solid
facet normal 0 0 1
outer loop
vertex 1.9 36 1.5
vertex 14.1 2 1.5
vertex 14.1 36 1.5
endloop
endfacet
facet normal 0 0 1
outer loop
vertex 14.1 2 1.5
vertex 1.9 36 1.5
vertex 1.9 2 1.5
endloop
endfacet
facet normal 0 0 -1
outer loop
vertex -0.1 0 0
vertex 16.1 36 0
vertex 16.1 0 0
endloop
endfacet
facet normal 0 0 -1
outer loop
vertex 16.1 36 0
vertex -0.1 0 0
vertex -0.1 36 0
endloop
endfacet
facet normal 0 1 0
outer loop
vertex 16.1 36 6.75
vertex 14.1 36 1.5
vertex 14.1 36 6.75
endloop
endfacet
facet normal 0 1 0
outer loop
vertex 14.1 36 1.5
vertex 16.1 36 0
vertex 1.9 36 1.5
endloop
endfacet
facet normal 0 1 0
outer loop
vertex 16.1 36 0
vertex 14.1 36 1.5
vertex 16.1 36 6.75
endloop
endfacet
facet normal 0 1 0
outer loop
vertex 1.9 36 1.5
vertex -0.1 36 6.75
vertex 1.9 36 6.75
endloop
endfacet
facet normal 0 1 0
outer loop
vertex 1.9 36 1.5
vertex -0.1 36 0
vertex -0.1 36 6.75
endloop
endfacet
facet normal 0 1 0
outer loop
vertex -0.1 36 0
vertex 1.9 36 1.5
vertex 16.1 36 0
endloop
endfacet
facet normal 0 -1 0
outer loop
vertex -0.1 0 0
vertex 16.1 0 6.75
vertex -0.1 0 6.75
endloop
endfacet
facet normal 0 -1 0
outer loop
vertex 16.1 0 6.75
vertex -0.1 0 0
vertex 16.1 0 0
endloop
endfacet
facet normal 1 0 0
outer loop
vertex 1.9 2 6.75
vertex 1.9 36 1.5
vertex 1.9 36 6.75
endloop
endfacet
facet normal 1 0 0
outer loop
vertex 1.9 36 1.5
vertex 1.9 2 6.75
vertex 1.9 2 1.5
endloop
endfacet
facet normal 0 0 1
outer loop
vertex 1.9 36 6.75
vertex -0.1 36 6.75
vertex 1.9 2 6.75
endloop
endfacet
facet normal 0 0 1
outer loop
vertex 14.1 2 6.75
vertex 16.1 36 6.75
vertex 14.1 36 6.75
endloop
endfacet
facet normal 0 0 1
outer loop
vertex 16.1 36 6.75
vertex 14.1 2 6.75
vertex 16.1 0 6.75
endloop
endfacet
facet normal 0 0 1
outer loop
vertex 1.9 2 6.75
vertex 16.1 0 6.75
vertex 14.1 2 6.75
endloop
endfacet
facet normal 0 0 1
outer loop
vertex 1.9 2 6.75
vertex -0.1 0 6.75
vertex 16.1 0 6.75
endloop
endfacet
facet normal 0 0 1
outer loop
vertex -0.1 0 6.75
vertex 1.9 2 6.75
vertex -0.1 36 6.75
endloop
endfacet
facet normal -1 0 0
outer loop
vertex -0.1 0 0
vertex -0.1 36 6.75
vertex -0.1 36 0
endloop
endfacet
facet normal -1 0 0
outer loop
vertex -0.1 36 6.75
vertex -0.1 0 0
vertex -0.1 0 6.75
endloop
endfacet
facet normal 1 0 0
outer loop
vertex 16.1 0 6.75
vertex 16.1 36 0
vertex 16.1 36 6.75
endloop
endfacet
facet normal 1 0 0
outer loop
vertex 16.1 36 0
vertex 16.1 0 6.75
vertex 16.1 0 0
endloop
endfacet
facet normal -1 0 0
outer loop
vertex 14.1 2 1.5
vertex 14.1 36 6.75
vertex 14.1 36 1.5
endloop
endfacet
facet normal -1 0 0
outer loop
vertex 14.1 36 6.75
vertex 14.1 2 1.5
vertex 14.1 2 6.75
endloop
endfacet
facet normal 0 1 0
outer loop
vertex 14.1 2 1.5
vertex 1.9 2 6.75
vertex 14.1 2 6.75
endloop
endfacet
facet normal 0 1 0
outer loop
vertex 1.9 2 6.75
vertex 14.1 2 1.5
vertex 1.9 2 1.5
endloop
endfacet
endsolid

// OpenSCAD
cube([16,36,1.5]);
translate([-0.1,0,0])
    cube([2,36,6.75]);
translate([14.1,0,0])
    cube([2,36,6.75]);
cube([15.8,2,6.75]);
